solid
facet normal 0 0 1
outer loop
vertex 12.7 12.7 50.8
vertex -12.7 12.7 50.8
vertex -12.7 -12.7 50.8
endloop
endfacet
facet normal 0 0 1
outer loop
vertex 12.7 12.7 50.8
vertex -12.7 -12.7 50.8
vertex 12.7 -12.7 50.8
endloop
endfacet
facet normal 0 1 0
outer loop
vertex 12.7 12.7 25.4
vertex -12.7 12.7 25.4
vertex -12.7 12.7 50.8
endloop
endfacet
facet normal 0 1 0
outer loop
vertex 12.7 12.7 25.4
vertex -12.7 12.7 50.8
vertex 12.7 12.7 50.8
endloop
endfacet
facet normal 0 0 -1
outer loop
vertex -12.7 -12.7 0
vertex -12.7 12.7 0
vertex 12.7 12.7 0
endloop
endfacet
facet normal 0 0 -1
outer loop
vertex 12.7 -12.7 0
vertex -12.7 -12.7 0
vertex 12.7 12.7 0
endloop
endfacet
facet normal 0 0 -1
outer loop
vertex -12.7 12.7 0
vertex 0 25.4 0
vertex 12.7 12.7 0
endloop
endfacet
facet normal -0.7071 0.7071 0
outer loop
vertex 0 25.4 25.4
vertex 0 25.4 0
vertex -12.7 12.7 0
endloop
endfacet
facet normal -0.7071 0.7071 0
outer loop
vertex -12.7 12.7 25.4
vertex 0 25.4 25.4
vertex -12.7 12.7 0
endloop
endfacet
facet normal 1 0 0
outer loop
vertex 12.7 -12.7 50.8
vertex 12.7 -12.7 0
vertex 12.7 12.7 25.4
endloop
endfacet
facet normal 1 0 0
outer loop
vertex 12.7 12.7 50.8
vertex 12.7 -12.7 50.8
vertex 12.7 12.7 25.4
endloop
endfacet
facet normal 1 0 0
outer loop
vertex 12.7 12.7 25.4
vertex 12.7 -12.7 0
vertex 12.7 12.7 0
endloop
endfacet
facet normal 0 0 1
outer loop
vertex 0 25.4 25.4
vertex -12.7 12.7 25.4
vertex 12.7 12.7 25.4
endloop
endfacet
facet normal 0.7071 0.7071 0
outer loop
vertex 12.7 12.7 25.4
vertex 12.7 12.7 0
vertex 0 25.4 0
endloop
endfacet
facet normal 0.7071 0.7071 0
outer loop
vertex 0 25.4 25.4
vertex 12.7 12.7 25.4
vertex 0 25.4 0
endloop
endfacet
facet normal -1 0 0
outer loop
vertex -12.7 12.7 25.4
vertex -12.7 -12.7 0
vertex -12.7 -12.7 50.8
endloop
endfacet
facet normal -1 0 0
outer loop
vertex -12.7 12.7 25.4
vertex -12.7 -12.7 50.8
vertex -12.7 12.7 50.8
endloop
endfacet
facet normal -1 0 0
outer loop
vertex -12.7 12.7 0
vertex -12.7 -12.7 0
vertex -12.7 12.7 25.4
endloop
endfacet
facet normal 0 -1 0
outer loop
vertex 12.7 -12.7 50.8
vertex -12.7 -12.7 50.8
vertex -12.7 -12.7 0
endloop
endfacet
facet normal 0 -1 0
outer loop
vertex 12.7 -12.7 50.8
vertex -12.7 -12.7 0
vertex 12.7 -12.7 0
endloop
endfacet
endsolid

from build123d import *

# Parameters (mm, degrees)
F1_DEPTH = 25.4
F0_W     = 25.4
F0_H     = 25.4
F2_DEPTH = 50.8


with BuildPart() as f1:
    # F0 (on Top) → F1 (new body)
    with BuildSketch(Plane.XY):
        Polygon((-12.7, 12.7), (12.7, 12.7), (0, 25.4), align=None)
    extrude(amount=F1_DEPTH)

    # F0 (on Top) → F2 (join)
    with BuildSketch(Plane.XY):
        Rectangle(F0_W, F0_H)
    extrude(amount=F2_DEPTH)


solid = f1.part
